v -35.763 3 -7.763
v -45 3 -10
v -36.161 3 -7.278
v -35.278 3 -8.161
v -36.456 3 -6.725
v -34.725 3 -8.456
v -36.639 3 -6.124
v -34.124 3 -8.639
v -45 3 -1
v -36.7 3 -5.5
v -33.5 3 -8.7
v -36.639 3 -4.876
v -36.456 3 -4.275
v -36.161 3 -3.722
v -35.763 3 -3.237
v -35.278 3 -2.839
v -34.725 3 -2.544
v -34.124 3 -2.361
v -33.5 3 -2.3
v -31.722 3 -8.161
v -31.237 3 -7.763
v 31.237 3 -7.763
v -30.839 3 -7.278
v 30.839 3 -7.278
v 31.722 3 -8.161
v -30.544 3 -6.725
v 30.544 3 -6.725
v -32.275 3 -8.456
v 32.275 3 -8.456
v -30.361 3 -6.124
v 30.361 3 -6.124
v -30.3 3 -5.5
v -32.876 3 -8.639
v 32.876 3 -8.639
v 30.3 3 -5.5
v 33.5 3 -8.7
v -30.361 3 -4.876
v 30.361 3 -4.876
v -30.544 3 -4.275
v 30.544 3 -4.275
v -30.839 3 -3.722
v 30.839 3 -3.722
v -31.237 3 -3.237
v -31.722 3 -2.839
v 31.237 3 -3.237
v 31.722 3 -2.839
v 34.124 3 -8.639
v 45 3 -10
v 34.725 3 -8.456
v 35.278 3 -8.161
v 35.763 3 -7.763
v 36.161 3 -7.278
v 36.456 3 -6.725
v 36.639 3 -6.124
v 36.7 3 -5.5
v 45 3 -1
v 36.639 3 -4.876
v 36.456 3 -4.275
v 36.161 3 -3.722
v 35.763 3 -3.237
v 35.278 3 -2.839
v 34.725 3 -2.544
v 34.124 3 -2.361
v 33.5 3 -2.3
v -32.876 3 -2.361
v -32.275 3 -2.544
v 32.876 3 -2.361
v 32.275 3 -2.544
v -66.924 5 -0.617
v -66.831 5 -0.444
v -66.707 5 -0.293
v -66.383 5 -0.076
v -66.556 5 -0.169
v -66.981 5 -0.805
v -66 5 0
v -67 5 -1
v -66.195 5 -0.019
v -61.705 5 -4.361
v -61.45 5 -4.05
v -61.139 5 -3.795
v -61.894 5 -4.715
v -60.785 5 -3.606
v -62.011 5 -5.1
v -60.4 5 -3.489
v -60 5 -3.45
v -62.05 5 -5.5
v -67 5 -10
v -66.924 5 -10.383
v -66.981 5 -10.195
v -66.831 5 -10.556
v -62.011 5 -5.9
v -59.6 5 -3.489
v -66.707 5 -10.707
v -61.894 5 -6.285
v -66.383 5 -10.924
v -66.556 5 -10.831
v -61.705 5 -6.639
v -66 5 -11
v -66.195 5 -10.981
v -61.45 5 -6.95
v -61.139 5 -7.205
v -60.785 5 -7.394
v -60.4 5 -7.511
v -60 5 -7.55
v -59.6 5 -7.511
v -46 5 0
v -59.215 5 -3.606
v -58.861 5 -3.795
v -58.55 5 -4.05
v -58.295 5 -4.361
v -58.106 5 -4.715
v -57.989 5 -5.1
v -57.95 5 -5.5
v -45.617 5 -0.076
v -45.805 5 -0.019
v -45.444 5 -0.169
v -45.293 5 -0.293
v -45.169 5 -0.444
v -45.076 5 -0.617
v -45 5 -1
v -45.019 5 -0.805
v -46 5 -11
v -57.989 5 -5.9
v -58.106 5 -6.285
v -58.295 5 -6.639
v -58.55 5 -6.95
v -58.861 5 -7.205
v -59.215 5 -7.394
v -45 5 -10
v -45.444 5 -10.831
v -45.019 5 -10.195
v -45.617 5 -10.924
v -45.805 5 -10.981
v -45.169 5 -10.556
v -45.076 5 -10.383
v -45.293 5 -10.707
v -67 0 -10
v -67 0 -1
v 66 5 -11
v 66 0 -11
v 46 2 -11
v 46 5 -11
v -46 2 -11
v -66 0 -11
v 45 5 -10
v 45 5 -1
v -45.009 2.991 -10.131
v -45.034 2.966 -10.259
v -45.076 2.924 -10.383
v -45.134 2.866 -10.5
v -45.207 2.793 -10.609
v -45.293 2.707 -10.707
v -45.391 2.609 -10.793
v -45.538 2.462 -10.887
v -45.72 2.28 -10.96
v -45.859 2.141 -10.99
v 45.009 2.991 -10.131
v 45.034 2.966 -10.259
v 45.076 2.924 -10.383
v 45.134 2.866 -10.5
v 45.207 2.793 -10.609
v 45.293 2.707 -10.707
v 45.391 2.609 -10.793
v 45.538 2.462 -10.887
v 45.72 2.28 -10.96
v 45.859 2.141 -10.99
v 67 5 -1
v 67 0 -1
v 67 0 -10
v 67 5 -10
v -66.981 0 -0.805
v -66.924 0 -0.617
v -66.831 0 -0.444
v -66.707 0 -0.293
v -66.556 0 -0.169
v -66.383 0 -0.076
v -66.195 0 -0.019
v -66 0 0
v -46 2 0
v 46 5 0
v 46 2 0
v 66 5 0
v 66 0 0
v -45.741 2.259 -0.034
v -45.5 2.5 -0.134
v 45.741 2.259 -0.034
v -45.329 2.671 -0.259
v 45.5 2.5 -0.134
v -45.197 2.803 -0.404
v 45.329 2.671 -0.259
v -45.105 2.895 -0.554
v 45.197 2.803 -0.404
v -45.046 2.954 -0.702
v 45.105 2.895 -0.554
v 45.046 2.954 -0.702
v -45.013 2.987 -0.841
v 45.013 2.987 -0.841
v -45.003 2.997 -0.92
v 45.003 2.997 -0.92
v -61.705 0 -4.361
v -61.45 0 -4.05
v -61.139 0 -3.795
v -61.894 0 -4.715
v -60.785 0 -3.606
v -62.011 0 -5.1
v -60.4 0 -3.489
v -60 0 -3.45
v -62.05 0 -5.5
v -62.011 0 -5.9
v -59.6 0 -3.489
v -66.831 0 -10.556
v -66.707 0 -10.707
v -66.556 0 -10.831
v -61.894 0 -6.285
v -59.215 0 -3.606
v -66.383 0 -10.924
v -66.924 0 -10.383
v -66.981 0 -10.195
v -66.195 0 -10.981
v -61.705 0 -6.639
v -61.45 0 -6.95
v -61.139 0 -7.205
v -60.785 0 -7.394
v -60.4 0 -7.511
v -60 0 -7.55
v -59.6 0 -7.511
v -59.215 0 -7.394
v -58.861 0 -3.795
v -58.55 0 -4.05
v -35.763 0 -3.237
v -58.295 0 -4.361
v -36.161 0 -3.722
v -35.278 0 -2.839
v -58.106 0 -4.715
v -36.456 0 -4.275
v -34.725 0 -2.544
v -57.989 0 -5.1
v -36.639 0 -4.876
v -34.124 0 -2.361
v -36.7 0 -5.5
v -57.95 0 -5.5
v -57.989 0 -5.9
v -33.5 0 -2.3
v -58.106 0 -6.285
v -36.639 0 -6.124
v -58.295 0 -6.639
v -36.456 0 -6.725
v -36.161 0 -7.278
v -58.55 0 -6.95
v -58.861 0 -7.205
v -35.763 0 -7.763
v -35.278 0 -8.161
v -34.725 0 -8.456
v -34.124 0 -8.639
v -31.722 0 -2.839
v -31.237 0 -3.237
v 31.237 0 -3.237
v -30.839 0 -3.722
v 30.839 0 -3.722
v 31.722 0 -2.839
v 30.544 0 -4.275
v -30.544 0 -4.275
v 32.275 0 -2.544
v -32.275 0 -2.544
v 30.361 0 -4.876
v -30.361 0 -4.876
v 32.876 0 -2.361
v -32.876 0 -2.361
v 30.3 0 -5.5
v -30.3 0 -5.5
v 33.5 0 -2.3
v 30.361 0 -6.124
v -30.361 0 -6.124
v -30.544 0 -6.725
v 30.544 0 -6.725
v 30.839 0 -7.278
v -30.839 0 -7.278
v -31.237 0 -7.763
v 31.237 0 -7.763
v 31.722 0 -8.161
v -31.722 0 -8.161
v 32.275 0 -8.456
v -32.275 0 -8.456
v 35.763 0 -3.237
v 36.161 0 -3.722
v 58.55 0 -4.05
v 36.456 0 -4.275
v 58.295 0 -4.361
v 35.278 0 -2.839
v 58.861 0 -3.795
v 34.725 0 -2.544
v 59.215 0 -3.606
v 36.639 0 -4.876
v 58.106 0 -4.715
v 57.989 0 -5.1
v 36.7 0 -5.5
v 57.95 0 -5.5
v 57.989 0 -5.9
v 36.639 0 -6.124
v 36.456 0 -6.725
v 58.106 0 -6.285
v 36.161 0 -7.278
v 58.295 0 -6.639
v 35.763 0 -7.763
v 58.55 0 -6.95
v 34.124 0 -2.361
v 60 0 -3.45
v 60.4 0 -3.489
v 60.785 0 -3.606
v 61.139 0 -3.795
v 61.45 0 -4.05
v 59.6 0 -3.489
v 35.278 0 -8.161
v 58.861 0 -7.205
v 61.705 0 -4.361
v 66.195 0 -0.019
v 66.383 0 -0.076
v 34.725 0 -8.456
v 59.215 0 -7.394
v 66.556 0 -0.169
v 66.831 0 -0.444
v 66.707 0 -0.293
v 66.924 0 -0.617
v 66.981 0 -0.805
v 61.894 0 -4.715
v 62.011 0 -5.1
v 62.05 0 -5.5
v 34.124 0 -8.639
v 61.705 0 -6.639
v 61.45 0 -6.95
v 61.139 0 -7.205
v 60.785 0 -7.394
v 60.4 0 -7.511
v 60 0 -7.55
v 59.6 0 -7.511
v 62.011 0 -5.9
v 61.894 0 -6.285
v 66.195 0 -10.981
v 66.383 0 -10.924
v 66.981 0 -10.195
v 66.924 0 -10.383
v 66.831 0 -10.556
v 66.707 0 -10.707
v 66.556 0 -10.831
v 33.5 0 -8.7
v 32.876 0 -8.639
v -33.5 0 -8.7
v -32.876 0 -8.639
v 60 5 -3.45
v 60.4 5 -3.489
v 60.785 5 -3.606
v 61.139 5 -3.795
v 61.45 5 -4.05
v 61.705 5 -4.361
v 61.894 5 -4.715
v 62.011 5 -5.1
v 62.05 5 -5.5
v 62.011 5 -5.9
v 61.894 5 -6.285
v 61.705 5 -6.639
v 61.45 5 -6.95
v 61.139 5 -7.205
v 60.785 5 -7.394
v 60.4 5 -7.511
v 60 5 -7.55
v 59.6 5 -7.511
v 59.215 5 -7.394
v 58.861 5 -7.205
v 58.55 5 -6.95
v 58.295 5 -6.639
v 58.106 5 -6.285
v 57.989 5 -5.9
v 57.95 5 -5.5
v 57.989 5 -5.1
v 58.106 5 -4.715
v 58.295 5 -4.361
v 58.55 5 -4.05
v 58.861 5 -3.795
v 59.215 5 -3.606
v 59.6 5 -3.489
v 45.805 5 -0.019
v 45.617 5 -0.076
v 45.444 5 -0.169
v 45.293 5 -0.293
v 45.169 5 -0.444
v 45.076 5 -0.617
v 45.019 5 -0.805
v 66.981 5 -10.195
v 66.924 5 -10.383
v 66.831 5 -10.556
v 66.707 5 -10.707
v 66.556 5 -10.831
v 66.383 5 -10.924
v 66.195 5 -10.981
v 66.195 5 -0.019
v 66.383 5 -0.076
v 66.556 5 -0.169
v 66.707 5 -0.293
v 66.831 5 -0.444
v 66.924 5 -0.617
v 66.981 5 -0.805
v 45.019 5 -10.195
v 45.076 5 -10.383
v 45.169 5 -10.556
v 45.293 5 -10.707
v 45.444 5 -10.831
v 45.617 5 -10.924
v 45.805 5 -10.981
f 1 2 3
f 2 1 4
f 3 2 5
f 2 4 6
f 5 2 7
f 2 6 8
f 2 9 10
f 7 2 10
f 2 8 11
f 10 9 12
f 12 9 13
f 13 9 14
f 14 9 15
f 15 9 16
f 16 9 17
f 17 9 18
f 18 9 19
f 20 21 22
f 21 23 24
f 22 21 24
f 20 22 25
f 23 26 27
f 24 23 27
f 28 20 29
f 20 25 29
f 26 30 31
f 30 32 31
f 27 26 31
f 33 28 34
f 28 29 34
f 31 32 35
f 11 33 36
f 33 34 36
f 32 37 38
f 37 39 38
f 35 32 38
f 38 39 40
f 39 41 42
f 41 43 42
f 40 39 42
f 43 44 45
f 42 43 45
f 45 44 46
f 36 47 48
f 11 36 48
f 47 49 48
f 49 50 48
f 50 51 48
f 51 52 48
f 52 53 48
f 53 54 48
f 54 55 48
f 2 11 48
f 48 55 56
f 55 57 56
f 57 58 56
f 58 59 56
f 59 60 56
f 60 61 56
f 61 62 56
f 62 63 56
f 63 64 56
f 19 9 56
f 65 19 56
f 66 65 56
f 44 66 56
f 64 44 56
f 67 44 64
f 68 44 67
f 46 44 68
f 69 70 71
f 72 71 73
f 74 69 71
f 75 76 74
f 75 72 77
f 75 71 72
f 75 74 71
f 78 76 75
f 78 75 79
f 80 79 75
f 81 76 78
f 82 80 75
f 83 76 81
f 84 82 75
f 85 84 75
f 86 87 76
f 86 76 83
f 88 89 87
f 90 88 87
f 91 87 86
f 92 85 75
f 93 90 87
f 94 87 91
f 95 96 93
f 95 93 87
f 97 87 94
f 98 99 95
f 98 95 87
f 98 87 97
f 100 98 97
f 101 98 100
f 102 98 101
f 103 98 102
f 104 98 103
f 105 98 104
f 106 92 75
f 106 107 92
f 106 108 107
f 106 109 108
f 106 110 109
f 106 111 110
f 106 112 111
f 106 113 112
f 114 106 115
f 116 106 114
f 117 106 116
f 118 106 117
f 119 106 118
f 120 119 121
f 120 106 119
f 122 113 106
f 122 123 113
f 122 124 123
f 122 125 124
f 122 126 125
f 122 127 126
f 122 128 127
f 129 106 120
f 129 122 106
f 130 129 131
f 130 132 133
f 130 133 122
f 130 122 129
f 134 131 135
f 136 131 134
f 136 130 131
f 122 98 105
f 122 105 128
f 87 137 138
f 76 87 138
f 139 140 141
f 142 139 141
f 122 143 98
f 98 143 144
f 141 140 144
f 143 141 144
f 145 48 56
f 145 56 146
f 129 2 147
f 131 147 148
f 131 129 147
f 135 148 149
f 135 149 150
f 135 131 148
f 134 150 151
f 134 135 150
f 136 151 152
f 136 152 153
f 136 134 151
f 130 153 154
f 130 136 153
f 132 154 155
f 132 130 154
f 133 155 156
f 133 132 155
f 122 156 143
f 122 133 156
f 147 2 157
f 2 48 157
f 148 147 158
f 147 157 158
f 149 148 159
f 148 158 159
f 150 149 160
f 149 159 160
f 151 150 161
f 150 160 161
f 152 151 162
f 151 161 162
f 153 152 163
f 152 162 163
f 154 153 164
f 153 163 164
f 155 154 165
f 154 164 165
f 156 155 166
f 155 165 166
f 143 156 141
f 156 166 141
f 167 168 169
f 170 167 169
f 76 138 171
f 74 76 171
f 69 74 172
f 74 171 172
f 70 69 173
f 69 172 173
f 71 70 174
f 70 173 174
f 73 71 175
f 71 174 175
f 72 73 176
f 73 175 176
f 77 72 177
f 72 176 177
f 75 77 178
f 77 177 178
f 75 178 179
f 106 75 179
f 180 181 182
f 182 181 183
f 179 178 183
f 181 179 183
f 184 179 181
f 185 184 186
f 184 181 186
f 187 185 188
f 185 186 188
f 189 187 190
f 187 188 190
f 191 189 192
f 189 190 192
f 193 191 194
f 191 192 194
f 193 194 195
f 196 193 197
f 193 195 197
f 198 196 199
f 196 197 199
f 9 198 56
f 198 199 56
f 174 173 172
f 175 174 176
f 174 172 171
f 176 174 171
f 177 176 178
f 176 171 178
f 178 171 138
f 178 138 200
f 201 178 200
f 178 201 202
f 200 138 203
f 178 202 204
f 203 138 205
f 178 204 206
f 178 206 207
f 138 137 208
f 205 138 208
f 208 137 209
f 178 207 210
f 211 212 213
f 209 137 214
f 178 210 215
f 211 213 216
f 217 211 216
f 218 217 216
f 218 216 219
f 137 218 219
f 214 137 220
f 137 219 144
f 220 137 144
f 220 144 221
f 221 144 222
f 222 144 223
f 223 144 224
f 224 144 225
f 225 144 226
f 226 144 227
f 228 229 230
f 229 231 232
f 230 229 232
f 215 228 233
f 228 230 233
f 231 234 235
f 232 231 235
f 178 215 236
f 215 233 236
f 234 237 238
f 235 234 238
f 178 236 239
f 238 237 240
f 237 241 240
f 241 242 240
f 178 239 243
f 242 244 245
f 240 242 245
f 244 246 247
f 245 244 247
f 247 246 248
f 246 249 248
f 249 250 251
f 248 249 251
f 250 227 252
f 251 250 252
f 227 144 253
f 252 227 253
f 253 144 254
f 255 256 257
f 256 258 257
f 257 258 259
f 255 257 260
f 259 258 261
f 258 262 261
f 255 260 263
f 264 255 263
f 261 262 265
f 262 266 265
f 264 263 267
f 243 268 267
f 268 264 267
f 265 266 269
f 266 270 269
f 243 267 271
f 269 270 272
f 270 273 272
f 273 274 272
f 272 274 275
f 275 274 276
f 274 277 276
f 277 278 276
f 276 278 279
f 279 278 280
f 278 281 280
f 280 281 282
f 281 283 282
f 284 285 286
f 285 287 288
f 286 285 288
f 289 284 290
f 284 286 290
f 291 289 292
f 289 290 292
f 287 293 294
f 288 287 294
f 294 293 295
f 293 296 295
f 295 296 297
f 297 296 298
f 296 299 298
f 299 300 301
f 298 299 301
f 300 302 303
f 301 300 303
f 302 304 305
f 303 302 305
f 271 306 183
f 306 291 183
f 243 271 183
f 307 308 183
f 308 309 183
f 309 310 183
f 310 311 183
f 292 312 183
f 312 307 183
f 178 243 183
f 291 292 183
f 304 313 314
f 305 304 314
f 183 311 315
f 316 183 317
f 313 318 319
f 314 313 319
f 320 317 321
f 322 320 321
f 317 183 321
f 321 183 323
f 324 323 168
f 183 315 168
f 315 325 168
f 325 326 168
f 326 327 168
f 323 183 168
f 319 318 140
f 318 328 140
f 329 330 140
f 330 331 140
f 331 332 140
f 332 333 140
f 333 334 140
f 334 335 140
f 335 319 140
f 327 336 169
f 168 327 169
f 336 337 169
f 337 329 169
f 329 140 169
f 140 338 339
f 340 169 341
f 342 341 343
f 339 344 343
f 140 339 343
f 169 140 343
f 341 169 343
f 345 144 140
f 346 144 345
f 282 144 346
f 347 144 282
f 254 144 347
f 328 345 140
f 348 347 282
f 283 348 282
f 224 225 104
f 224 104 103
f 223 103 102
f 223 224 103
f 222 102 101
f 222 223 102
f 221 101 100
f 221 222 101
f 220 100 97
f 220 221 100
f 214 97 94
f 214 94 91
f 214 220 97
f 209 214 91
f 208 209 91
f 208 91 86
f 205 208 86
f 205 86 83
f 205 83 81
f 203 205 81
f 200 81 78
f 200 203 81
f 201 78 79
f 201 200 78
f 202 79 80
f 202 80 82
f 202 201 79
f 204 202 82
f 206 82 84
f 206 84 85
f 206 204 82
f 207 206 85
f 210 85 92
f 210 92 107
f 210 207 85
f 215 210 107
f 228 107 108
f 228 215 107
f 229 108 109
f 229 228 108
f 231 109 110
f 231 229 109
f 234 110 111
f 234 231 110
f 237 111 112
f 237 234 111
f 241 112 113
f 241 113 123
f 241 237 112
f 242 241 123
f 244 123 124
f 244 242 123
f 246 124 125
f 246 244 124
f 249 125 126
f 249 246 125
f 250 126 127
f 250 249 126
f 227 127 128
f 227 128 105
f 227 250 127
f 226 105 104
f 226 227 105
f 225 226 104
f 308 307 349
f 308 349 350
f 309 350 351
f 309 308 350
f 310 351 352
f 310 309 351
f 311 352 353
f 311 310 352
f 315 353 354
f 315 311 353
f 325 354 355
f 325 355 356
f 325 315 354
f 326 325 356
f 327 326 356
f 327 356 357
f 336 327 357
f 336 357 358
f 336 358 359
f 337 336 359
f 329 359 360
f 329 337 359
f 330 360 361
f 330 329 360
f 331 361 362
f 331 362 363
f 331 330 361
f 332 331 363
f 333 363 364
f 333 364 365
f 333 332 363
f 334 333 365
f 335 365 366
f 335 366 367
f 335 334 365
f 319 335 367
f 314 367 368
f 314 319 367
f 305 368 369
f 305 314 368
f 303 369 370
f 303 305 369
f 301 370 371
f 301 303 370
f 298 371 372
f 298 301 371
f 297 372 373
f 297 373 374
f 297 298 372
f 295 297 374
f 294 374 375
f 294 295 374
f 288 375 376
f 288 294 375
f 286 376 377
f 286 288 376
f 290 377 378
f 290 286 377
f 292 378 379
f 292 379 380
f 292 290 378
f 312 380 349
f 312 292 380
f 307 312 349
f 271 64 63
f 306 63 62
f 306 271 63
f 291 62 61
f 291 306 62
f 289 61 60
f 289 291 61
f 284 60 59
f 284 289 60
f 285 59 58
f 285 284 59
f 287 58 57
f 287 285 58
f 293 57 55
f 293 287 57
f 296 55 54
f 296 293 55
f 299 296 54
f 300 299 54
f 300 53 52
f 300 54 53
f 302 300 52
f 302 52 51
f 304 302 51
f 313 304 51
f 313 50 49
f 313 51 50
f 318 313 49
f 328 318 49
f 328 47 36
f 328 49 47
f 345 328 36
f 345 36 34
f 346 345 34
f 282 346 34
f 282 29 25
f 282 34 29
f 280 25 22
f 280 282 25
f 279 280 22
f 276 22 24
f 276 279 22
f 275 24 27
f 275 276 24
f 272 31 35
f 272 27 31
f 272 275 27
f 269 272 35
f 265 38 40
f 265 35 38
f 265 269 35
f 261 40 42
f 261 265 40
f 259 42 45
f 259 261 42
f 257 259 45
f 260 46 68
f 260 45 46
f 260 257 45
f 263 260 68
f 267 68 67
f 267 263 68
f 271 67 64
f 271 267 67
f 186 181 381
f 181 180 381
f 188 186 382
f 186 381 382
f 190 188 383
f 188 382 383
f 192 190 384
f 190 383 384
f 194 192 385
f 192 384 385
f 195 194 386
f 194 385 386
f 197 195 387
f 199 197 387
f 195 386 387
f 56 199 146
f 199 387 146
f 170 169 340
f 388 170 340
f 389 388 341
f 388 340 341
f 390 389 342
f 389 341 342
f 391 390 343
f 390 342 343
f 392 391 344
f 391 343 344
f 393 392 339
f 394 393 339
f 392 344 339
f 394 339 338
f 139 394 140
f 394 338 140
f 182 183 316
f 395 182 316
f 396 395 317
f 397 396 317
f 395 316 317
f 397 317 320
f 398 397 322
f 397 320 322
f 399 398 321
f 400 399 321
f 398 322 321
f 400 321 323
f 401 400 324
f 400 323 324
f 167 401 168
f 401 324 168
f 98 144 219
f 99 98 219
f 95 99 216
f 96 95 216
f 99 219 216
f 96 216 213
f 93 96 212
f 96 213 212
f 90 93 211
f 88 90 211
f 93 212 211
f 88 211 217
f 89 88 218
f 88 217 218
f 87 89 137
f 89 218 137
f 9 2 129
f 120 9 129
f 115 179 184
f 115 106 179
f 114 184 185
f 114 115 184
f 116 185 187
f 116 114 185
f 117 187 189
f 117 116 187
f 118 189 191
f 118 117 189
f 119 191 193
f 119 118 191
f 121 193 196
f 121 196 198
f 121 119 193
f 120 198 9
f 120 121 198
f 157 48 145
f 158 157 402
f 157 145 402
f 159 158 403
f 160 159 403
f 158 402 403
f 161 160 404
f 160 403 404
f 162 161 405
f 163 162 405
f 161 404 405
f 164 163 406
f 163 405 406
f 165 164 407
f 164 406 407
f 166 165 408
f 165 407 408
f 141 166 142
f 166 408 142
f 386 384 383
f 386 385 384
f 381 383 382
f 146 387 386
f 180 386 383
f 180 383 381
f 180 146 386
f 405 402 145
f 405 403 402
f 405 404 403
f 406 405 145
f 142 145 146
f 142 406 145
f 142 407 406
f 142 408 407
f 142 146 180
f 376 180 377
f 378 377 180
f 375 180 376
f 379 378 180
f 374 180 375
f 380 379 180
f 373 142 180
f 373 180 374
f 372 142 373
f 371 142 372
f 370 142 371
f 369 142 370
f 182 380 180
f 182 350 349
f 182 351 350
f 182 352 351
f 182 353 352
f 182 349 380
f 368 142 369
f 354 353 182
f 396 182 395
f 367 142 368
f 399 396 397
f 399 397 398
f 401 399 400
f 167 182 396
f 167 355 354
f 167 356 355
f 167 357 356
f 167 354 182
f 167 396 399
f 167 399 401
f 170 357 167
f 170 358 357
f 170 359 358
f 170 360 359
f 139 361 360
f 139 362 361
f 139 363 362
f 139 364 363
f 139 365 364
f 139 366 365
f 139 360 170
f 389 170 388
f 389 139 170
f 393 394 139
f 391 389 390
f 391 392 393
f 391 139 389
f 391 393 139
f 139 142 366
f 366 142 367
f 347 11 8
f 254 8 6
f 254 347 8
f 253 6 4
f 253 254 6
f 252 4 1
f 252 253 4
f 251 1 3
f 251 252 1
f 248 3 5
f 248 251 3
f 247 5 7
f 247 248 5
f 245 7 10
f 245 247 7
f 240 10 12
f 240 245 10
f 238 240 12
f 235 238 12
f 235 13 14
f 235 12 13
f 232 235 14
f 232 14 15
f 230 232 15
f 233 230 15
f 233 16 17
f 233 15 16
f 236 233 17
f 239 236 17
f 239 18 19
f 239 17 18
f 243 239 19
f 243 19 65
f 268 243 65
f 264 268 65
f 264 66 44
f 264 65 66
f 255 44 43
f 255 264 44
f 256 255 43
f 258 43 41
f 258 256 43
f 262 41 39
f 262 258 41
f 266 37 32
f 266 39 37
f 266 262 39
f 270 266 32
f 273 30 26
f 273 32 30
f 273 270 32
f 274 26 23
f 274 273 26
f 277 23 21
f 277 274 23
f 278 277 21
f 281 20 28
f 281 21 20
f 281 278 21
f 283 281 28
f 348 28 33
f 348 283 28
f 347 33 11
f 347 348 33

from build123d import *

# Parameters (mm, degrees)
ESQUISSE1_R             = 2.05
ESQUISSE1_R_2           = 3.2
BOSS_EXTRU_1_DEPTH      = 5
ESQUISSE2_W             = 90
ESQUISSE2_H             = 2
ENL_V_MAT_EXTRU_1_DEPTH = 69.080834307
CONG_1_R                = 1


with BuildPart() as part:
    # Esquisse1 → Boss.-Extru.1 (new body)
    with BuildSketch(Plane(origin=(0, 0, 0), x_dir=(1, 0, 0), z_dir=(0, 1, 0))):
        with BuildLine():
            Line((-66, 0), (66, 0))
            ThreePointArc((66, 0), (66.707106781, 0.292893219), (67, 1))
            Line((67, 1), (67, 10))
            ThreePointArc((67, 10), (66.707106781, 10.707106781), (66, 11))
            Line((66, 11), (-66, 11))
            ThreePointArc((-66, 11), (-66.707106781, 10.707106781), (-67, 10))
            Line((-67, 10), (-67, 1))
            ThreePointArc((-67, 1), (-66.707106781, 0.292893219), (-66, 0))
        make_face()
        with Locations(Location((60, 5.5, 0), (0, 0, 270))):
            Circle(ESQUISSE1_R, mode=Mode.SUBTRACT)
        with Locations(Location((33.5, 5.5, 0), (0, 0, 270))):
            Circle(ESQUISSE1_R_2, mode=Mode.SUBTRACT)
        with Locations(Location((-33.5, 5.5, 0), (0, 0, 90))):
            Circle(ESQUISSE1_R_2, mode=Mode.SUBTRACT)
        with Locations(Location((-60, 5.5, 0), (0, 0, 90))):
            Circle(ESQUISSE1_R, mode=Mode.SUBTRACT)
    extrude(amount=BOSS_EXTRU_1_DEPTH)

    # Esquisse2 → Enlèv. mat.-Extru.1 (cut, through all)
    with BuildSketch(Plane.XY):
        with Locations((0, 4)):
            Rectangle(ESQUISSE2_W, ESQUISSE2_H)
    extrude(amount=-ENL_V_MAT_EXTRU_1_DEPTH, mode=Mode.SUBTRACT)

    # Congé1
    cong_1_edges = [part.edges().sort_by_distance(p)[0] for p in [
        (-45, 4, -11),
        (45, 4, 0),
        (0, 3, -11),
        (45, 4, -11),
        (-45, 4, 0),
        (0, 3, 0),
    ]]
    fillet(cong_1_edges, radius=CONG_1_R)


solid = part.part
